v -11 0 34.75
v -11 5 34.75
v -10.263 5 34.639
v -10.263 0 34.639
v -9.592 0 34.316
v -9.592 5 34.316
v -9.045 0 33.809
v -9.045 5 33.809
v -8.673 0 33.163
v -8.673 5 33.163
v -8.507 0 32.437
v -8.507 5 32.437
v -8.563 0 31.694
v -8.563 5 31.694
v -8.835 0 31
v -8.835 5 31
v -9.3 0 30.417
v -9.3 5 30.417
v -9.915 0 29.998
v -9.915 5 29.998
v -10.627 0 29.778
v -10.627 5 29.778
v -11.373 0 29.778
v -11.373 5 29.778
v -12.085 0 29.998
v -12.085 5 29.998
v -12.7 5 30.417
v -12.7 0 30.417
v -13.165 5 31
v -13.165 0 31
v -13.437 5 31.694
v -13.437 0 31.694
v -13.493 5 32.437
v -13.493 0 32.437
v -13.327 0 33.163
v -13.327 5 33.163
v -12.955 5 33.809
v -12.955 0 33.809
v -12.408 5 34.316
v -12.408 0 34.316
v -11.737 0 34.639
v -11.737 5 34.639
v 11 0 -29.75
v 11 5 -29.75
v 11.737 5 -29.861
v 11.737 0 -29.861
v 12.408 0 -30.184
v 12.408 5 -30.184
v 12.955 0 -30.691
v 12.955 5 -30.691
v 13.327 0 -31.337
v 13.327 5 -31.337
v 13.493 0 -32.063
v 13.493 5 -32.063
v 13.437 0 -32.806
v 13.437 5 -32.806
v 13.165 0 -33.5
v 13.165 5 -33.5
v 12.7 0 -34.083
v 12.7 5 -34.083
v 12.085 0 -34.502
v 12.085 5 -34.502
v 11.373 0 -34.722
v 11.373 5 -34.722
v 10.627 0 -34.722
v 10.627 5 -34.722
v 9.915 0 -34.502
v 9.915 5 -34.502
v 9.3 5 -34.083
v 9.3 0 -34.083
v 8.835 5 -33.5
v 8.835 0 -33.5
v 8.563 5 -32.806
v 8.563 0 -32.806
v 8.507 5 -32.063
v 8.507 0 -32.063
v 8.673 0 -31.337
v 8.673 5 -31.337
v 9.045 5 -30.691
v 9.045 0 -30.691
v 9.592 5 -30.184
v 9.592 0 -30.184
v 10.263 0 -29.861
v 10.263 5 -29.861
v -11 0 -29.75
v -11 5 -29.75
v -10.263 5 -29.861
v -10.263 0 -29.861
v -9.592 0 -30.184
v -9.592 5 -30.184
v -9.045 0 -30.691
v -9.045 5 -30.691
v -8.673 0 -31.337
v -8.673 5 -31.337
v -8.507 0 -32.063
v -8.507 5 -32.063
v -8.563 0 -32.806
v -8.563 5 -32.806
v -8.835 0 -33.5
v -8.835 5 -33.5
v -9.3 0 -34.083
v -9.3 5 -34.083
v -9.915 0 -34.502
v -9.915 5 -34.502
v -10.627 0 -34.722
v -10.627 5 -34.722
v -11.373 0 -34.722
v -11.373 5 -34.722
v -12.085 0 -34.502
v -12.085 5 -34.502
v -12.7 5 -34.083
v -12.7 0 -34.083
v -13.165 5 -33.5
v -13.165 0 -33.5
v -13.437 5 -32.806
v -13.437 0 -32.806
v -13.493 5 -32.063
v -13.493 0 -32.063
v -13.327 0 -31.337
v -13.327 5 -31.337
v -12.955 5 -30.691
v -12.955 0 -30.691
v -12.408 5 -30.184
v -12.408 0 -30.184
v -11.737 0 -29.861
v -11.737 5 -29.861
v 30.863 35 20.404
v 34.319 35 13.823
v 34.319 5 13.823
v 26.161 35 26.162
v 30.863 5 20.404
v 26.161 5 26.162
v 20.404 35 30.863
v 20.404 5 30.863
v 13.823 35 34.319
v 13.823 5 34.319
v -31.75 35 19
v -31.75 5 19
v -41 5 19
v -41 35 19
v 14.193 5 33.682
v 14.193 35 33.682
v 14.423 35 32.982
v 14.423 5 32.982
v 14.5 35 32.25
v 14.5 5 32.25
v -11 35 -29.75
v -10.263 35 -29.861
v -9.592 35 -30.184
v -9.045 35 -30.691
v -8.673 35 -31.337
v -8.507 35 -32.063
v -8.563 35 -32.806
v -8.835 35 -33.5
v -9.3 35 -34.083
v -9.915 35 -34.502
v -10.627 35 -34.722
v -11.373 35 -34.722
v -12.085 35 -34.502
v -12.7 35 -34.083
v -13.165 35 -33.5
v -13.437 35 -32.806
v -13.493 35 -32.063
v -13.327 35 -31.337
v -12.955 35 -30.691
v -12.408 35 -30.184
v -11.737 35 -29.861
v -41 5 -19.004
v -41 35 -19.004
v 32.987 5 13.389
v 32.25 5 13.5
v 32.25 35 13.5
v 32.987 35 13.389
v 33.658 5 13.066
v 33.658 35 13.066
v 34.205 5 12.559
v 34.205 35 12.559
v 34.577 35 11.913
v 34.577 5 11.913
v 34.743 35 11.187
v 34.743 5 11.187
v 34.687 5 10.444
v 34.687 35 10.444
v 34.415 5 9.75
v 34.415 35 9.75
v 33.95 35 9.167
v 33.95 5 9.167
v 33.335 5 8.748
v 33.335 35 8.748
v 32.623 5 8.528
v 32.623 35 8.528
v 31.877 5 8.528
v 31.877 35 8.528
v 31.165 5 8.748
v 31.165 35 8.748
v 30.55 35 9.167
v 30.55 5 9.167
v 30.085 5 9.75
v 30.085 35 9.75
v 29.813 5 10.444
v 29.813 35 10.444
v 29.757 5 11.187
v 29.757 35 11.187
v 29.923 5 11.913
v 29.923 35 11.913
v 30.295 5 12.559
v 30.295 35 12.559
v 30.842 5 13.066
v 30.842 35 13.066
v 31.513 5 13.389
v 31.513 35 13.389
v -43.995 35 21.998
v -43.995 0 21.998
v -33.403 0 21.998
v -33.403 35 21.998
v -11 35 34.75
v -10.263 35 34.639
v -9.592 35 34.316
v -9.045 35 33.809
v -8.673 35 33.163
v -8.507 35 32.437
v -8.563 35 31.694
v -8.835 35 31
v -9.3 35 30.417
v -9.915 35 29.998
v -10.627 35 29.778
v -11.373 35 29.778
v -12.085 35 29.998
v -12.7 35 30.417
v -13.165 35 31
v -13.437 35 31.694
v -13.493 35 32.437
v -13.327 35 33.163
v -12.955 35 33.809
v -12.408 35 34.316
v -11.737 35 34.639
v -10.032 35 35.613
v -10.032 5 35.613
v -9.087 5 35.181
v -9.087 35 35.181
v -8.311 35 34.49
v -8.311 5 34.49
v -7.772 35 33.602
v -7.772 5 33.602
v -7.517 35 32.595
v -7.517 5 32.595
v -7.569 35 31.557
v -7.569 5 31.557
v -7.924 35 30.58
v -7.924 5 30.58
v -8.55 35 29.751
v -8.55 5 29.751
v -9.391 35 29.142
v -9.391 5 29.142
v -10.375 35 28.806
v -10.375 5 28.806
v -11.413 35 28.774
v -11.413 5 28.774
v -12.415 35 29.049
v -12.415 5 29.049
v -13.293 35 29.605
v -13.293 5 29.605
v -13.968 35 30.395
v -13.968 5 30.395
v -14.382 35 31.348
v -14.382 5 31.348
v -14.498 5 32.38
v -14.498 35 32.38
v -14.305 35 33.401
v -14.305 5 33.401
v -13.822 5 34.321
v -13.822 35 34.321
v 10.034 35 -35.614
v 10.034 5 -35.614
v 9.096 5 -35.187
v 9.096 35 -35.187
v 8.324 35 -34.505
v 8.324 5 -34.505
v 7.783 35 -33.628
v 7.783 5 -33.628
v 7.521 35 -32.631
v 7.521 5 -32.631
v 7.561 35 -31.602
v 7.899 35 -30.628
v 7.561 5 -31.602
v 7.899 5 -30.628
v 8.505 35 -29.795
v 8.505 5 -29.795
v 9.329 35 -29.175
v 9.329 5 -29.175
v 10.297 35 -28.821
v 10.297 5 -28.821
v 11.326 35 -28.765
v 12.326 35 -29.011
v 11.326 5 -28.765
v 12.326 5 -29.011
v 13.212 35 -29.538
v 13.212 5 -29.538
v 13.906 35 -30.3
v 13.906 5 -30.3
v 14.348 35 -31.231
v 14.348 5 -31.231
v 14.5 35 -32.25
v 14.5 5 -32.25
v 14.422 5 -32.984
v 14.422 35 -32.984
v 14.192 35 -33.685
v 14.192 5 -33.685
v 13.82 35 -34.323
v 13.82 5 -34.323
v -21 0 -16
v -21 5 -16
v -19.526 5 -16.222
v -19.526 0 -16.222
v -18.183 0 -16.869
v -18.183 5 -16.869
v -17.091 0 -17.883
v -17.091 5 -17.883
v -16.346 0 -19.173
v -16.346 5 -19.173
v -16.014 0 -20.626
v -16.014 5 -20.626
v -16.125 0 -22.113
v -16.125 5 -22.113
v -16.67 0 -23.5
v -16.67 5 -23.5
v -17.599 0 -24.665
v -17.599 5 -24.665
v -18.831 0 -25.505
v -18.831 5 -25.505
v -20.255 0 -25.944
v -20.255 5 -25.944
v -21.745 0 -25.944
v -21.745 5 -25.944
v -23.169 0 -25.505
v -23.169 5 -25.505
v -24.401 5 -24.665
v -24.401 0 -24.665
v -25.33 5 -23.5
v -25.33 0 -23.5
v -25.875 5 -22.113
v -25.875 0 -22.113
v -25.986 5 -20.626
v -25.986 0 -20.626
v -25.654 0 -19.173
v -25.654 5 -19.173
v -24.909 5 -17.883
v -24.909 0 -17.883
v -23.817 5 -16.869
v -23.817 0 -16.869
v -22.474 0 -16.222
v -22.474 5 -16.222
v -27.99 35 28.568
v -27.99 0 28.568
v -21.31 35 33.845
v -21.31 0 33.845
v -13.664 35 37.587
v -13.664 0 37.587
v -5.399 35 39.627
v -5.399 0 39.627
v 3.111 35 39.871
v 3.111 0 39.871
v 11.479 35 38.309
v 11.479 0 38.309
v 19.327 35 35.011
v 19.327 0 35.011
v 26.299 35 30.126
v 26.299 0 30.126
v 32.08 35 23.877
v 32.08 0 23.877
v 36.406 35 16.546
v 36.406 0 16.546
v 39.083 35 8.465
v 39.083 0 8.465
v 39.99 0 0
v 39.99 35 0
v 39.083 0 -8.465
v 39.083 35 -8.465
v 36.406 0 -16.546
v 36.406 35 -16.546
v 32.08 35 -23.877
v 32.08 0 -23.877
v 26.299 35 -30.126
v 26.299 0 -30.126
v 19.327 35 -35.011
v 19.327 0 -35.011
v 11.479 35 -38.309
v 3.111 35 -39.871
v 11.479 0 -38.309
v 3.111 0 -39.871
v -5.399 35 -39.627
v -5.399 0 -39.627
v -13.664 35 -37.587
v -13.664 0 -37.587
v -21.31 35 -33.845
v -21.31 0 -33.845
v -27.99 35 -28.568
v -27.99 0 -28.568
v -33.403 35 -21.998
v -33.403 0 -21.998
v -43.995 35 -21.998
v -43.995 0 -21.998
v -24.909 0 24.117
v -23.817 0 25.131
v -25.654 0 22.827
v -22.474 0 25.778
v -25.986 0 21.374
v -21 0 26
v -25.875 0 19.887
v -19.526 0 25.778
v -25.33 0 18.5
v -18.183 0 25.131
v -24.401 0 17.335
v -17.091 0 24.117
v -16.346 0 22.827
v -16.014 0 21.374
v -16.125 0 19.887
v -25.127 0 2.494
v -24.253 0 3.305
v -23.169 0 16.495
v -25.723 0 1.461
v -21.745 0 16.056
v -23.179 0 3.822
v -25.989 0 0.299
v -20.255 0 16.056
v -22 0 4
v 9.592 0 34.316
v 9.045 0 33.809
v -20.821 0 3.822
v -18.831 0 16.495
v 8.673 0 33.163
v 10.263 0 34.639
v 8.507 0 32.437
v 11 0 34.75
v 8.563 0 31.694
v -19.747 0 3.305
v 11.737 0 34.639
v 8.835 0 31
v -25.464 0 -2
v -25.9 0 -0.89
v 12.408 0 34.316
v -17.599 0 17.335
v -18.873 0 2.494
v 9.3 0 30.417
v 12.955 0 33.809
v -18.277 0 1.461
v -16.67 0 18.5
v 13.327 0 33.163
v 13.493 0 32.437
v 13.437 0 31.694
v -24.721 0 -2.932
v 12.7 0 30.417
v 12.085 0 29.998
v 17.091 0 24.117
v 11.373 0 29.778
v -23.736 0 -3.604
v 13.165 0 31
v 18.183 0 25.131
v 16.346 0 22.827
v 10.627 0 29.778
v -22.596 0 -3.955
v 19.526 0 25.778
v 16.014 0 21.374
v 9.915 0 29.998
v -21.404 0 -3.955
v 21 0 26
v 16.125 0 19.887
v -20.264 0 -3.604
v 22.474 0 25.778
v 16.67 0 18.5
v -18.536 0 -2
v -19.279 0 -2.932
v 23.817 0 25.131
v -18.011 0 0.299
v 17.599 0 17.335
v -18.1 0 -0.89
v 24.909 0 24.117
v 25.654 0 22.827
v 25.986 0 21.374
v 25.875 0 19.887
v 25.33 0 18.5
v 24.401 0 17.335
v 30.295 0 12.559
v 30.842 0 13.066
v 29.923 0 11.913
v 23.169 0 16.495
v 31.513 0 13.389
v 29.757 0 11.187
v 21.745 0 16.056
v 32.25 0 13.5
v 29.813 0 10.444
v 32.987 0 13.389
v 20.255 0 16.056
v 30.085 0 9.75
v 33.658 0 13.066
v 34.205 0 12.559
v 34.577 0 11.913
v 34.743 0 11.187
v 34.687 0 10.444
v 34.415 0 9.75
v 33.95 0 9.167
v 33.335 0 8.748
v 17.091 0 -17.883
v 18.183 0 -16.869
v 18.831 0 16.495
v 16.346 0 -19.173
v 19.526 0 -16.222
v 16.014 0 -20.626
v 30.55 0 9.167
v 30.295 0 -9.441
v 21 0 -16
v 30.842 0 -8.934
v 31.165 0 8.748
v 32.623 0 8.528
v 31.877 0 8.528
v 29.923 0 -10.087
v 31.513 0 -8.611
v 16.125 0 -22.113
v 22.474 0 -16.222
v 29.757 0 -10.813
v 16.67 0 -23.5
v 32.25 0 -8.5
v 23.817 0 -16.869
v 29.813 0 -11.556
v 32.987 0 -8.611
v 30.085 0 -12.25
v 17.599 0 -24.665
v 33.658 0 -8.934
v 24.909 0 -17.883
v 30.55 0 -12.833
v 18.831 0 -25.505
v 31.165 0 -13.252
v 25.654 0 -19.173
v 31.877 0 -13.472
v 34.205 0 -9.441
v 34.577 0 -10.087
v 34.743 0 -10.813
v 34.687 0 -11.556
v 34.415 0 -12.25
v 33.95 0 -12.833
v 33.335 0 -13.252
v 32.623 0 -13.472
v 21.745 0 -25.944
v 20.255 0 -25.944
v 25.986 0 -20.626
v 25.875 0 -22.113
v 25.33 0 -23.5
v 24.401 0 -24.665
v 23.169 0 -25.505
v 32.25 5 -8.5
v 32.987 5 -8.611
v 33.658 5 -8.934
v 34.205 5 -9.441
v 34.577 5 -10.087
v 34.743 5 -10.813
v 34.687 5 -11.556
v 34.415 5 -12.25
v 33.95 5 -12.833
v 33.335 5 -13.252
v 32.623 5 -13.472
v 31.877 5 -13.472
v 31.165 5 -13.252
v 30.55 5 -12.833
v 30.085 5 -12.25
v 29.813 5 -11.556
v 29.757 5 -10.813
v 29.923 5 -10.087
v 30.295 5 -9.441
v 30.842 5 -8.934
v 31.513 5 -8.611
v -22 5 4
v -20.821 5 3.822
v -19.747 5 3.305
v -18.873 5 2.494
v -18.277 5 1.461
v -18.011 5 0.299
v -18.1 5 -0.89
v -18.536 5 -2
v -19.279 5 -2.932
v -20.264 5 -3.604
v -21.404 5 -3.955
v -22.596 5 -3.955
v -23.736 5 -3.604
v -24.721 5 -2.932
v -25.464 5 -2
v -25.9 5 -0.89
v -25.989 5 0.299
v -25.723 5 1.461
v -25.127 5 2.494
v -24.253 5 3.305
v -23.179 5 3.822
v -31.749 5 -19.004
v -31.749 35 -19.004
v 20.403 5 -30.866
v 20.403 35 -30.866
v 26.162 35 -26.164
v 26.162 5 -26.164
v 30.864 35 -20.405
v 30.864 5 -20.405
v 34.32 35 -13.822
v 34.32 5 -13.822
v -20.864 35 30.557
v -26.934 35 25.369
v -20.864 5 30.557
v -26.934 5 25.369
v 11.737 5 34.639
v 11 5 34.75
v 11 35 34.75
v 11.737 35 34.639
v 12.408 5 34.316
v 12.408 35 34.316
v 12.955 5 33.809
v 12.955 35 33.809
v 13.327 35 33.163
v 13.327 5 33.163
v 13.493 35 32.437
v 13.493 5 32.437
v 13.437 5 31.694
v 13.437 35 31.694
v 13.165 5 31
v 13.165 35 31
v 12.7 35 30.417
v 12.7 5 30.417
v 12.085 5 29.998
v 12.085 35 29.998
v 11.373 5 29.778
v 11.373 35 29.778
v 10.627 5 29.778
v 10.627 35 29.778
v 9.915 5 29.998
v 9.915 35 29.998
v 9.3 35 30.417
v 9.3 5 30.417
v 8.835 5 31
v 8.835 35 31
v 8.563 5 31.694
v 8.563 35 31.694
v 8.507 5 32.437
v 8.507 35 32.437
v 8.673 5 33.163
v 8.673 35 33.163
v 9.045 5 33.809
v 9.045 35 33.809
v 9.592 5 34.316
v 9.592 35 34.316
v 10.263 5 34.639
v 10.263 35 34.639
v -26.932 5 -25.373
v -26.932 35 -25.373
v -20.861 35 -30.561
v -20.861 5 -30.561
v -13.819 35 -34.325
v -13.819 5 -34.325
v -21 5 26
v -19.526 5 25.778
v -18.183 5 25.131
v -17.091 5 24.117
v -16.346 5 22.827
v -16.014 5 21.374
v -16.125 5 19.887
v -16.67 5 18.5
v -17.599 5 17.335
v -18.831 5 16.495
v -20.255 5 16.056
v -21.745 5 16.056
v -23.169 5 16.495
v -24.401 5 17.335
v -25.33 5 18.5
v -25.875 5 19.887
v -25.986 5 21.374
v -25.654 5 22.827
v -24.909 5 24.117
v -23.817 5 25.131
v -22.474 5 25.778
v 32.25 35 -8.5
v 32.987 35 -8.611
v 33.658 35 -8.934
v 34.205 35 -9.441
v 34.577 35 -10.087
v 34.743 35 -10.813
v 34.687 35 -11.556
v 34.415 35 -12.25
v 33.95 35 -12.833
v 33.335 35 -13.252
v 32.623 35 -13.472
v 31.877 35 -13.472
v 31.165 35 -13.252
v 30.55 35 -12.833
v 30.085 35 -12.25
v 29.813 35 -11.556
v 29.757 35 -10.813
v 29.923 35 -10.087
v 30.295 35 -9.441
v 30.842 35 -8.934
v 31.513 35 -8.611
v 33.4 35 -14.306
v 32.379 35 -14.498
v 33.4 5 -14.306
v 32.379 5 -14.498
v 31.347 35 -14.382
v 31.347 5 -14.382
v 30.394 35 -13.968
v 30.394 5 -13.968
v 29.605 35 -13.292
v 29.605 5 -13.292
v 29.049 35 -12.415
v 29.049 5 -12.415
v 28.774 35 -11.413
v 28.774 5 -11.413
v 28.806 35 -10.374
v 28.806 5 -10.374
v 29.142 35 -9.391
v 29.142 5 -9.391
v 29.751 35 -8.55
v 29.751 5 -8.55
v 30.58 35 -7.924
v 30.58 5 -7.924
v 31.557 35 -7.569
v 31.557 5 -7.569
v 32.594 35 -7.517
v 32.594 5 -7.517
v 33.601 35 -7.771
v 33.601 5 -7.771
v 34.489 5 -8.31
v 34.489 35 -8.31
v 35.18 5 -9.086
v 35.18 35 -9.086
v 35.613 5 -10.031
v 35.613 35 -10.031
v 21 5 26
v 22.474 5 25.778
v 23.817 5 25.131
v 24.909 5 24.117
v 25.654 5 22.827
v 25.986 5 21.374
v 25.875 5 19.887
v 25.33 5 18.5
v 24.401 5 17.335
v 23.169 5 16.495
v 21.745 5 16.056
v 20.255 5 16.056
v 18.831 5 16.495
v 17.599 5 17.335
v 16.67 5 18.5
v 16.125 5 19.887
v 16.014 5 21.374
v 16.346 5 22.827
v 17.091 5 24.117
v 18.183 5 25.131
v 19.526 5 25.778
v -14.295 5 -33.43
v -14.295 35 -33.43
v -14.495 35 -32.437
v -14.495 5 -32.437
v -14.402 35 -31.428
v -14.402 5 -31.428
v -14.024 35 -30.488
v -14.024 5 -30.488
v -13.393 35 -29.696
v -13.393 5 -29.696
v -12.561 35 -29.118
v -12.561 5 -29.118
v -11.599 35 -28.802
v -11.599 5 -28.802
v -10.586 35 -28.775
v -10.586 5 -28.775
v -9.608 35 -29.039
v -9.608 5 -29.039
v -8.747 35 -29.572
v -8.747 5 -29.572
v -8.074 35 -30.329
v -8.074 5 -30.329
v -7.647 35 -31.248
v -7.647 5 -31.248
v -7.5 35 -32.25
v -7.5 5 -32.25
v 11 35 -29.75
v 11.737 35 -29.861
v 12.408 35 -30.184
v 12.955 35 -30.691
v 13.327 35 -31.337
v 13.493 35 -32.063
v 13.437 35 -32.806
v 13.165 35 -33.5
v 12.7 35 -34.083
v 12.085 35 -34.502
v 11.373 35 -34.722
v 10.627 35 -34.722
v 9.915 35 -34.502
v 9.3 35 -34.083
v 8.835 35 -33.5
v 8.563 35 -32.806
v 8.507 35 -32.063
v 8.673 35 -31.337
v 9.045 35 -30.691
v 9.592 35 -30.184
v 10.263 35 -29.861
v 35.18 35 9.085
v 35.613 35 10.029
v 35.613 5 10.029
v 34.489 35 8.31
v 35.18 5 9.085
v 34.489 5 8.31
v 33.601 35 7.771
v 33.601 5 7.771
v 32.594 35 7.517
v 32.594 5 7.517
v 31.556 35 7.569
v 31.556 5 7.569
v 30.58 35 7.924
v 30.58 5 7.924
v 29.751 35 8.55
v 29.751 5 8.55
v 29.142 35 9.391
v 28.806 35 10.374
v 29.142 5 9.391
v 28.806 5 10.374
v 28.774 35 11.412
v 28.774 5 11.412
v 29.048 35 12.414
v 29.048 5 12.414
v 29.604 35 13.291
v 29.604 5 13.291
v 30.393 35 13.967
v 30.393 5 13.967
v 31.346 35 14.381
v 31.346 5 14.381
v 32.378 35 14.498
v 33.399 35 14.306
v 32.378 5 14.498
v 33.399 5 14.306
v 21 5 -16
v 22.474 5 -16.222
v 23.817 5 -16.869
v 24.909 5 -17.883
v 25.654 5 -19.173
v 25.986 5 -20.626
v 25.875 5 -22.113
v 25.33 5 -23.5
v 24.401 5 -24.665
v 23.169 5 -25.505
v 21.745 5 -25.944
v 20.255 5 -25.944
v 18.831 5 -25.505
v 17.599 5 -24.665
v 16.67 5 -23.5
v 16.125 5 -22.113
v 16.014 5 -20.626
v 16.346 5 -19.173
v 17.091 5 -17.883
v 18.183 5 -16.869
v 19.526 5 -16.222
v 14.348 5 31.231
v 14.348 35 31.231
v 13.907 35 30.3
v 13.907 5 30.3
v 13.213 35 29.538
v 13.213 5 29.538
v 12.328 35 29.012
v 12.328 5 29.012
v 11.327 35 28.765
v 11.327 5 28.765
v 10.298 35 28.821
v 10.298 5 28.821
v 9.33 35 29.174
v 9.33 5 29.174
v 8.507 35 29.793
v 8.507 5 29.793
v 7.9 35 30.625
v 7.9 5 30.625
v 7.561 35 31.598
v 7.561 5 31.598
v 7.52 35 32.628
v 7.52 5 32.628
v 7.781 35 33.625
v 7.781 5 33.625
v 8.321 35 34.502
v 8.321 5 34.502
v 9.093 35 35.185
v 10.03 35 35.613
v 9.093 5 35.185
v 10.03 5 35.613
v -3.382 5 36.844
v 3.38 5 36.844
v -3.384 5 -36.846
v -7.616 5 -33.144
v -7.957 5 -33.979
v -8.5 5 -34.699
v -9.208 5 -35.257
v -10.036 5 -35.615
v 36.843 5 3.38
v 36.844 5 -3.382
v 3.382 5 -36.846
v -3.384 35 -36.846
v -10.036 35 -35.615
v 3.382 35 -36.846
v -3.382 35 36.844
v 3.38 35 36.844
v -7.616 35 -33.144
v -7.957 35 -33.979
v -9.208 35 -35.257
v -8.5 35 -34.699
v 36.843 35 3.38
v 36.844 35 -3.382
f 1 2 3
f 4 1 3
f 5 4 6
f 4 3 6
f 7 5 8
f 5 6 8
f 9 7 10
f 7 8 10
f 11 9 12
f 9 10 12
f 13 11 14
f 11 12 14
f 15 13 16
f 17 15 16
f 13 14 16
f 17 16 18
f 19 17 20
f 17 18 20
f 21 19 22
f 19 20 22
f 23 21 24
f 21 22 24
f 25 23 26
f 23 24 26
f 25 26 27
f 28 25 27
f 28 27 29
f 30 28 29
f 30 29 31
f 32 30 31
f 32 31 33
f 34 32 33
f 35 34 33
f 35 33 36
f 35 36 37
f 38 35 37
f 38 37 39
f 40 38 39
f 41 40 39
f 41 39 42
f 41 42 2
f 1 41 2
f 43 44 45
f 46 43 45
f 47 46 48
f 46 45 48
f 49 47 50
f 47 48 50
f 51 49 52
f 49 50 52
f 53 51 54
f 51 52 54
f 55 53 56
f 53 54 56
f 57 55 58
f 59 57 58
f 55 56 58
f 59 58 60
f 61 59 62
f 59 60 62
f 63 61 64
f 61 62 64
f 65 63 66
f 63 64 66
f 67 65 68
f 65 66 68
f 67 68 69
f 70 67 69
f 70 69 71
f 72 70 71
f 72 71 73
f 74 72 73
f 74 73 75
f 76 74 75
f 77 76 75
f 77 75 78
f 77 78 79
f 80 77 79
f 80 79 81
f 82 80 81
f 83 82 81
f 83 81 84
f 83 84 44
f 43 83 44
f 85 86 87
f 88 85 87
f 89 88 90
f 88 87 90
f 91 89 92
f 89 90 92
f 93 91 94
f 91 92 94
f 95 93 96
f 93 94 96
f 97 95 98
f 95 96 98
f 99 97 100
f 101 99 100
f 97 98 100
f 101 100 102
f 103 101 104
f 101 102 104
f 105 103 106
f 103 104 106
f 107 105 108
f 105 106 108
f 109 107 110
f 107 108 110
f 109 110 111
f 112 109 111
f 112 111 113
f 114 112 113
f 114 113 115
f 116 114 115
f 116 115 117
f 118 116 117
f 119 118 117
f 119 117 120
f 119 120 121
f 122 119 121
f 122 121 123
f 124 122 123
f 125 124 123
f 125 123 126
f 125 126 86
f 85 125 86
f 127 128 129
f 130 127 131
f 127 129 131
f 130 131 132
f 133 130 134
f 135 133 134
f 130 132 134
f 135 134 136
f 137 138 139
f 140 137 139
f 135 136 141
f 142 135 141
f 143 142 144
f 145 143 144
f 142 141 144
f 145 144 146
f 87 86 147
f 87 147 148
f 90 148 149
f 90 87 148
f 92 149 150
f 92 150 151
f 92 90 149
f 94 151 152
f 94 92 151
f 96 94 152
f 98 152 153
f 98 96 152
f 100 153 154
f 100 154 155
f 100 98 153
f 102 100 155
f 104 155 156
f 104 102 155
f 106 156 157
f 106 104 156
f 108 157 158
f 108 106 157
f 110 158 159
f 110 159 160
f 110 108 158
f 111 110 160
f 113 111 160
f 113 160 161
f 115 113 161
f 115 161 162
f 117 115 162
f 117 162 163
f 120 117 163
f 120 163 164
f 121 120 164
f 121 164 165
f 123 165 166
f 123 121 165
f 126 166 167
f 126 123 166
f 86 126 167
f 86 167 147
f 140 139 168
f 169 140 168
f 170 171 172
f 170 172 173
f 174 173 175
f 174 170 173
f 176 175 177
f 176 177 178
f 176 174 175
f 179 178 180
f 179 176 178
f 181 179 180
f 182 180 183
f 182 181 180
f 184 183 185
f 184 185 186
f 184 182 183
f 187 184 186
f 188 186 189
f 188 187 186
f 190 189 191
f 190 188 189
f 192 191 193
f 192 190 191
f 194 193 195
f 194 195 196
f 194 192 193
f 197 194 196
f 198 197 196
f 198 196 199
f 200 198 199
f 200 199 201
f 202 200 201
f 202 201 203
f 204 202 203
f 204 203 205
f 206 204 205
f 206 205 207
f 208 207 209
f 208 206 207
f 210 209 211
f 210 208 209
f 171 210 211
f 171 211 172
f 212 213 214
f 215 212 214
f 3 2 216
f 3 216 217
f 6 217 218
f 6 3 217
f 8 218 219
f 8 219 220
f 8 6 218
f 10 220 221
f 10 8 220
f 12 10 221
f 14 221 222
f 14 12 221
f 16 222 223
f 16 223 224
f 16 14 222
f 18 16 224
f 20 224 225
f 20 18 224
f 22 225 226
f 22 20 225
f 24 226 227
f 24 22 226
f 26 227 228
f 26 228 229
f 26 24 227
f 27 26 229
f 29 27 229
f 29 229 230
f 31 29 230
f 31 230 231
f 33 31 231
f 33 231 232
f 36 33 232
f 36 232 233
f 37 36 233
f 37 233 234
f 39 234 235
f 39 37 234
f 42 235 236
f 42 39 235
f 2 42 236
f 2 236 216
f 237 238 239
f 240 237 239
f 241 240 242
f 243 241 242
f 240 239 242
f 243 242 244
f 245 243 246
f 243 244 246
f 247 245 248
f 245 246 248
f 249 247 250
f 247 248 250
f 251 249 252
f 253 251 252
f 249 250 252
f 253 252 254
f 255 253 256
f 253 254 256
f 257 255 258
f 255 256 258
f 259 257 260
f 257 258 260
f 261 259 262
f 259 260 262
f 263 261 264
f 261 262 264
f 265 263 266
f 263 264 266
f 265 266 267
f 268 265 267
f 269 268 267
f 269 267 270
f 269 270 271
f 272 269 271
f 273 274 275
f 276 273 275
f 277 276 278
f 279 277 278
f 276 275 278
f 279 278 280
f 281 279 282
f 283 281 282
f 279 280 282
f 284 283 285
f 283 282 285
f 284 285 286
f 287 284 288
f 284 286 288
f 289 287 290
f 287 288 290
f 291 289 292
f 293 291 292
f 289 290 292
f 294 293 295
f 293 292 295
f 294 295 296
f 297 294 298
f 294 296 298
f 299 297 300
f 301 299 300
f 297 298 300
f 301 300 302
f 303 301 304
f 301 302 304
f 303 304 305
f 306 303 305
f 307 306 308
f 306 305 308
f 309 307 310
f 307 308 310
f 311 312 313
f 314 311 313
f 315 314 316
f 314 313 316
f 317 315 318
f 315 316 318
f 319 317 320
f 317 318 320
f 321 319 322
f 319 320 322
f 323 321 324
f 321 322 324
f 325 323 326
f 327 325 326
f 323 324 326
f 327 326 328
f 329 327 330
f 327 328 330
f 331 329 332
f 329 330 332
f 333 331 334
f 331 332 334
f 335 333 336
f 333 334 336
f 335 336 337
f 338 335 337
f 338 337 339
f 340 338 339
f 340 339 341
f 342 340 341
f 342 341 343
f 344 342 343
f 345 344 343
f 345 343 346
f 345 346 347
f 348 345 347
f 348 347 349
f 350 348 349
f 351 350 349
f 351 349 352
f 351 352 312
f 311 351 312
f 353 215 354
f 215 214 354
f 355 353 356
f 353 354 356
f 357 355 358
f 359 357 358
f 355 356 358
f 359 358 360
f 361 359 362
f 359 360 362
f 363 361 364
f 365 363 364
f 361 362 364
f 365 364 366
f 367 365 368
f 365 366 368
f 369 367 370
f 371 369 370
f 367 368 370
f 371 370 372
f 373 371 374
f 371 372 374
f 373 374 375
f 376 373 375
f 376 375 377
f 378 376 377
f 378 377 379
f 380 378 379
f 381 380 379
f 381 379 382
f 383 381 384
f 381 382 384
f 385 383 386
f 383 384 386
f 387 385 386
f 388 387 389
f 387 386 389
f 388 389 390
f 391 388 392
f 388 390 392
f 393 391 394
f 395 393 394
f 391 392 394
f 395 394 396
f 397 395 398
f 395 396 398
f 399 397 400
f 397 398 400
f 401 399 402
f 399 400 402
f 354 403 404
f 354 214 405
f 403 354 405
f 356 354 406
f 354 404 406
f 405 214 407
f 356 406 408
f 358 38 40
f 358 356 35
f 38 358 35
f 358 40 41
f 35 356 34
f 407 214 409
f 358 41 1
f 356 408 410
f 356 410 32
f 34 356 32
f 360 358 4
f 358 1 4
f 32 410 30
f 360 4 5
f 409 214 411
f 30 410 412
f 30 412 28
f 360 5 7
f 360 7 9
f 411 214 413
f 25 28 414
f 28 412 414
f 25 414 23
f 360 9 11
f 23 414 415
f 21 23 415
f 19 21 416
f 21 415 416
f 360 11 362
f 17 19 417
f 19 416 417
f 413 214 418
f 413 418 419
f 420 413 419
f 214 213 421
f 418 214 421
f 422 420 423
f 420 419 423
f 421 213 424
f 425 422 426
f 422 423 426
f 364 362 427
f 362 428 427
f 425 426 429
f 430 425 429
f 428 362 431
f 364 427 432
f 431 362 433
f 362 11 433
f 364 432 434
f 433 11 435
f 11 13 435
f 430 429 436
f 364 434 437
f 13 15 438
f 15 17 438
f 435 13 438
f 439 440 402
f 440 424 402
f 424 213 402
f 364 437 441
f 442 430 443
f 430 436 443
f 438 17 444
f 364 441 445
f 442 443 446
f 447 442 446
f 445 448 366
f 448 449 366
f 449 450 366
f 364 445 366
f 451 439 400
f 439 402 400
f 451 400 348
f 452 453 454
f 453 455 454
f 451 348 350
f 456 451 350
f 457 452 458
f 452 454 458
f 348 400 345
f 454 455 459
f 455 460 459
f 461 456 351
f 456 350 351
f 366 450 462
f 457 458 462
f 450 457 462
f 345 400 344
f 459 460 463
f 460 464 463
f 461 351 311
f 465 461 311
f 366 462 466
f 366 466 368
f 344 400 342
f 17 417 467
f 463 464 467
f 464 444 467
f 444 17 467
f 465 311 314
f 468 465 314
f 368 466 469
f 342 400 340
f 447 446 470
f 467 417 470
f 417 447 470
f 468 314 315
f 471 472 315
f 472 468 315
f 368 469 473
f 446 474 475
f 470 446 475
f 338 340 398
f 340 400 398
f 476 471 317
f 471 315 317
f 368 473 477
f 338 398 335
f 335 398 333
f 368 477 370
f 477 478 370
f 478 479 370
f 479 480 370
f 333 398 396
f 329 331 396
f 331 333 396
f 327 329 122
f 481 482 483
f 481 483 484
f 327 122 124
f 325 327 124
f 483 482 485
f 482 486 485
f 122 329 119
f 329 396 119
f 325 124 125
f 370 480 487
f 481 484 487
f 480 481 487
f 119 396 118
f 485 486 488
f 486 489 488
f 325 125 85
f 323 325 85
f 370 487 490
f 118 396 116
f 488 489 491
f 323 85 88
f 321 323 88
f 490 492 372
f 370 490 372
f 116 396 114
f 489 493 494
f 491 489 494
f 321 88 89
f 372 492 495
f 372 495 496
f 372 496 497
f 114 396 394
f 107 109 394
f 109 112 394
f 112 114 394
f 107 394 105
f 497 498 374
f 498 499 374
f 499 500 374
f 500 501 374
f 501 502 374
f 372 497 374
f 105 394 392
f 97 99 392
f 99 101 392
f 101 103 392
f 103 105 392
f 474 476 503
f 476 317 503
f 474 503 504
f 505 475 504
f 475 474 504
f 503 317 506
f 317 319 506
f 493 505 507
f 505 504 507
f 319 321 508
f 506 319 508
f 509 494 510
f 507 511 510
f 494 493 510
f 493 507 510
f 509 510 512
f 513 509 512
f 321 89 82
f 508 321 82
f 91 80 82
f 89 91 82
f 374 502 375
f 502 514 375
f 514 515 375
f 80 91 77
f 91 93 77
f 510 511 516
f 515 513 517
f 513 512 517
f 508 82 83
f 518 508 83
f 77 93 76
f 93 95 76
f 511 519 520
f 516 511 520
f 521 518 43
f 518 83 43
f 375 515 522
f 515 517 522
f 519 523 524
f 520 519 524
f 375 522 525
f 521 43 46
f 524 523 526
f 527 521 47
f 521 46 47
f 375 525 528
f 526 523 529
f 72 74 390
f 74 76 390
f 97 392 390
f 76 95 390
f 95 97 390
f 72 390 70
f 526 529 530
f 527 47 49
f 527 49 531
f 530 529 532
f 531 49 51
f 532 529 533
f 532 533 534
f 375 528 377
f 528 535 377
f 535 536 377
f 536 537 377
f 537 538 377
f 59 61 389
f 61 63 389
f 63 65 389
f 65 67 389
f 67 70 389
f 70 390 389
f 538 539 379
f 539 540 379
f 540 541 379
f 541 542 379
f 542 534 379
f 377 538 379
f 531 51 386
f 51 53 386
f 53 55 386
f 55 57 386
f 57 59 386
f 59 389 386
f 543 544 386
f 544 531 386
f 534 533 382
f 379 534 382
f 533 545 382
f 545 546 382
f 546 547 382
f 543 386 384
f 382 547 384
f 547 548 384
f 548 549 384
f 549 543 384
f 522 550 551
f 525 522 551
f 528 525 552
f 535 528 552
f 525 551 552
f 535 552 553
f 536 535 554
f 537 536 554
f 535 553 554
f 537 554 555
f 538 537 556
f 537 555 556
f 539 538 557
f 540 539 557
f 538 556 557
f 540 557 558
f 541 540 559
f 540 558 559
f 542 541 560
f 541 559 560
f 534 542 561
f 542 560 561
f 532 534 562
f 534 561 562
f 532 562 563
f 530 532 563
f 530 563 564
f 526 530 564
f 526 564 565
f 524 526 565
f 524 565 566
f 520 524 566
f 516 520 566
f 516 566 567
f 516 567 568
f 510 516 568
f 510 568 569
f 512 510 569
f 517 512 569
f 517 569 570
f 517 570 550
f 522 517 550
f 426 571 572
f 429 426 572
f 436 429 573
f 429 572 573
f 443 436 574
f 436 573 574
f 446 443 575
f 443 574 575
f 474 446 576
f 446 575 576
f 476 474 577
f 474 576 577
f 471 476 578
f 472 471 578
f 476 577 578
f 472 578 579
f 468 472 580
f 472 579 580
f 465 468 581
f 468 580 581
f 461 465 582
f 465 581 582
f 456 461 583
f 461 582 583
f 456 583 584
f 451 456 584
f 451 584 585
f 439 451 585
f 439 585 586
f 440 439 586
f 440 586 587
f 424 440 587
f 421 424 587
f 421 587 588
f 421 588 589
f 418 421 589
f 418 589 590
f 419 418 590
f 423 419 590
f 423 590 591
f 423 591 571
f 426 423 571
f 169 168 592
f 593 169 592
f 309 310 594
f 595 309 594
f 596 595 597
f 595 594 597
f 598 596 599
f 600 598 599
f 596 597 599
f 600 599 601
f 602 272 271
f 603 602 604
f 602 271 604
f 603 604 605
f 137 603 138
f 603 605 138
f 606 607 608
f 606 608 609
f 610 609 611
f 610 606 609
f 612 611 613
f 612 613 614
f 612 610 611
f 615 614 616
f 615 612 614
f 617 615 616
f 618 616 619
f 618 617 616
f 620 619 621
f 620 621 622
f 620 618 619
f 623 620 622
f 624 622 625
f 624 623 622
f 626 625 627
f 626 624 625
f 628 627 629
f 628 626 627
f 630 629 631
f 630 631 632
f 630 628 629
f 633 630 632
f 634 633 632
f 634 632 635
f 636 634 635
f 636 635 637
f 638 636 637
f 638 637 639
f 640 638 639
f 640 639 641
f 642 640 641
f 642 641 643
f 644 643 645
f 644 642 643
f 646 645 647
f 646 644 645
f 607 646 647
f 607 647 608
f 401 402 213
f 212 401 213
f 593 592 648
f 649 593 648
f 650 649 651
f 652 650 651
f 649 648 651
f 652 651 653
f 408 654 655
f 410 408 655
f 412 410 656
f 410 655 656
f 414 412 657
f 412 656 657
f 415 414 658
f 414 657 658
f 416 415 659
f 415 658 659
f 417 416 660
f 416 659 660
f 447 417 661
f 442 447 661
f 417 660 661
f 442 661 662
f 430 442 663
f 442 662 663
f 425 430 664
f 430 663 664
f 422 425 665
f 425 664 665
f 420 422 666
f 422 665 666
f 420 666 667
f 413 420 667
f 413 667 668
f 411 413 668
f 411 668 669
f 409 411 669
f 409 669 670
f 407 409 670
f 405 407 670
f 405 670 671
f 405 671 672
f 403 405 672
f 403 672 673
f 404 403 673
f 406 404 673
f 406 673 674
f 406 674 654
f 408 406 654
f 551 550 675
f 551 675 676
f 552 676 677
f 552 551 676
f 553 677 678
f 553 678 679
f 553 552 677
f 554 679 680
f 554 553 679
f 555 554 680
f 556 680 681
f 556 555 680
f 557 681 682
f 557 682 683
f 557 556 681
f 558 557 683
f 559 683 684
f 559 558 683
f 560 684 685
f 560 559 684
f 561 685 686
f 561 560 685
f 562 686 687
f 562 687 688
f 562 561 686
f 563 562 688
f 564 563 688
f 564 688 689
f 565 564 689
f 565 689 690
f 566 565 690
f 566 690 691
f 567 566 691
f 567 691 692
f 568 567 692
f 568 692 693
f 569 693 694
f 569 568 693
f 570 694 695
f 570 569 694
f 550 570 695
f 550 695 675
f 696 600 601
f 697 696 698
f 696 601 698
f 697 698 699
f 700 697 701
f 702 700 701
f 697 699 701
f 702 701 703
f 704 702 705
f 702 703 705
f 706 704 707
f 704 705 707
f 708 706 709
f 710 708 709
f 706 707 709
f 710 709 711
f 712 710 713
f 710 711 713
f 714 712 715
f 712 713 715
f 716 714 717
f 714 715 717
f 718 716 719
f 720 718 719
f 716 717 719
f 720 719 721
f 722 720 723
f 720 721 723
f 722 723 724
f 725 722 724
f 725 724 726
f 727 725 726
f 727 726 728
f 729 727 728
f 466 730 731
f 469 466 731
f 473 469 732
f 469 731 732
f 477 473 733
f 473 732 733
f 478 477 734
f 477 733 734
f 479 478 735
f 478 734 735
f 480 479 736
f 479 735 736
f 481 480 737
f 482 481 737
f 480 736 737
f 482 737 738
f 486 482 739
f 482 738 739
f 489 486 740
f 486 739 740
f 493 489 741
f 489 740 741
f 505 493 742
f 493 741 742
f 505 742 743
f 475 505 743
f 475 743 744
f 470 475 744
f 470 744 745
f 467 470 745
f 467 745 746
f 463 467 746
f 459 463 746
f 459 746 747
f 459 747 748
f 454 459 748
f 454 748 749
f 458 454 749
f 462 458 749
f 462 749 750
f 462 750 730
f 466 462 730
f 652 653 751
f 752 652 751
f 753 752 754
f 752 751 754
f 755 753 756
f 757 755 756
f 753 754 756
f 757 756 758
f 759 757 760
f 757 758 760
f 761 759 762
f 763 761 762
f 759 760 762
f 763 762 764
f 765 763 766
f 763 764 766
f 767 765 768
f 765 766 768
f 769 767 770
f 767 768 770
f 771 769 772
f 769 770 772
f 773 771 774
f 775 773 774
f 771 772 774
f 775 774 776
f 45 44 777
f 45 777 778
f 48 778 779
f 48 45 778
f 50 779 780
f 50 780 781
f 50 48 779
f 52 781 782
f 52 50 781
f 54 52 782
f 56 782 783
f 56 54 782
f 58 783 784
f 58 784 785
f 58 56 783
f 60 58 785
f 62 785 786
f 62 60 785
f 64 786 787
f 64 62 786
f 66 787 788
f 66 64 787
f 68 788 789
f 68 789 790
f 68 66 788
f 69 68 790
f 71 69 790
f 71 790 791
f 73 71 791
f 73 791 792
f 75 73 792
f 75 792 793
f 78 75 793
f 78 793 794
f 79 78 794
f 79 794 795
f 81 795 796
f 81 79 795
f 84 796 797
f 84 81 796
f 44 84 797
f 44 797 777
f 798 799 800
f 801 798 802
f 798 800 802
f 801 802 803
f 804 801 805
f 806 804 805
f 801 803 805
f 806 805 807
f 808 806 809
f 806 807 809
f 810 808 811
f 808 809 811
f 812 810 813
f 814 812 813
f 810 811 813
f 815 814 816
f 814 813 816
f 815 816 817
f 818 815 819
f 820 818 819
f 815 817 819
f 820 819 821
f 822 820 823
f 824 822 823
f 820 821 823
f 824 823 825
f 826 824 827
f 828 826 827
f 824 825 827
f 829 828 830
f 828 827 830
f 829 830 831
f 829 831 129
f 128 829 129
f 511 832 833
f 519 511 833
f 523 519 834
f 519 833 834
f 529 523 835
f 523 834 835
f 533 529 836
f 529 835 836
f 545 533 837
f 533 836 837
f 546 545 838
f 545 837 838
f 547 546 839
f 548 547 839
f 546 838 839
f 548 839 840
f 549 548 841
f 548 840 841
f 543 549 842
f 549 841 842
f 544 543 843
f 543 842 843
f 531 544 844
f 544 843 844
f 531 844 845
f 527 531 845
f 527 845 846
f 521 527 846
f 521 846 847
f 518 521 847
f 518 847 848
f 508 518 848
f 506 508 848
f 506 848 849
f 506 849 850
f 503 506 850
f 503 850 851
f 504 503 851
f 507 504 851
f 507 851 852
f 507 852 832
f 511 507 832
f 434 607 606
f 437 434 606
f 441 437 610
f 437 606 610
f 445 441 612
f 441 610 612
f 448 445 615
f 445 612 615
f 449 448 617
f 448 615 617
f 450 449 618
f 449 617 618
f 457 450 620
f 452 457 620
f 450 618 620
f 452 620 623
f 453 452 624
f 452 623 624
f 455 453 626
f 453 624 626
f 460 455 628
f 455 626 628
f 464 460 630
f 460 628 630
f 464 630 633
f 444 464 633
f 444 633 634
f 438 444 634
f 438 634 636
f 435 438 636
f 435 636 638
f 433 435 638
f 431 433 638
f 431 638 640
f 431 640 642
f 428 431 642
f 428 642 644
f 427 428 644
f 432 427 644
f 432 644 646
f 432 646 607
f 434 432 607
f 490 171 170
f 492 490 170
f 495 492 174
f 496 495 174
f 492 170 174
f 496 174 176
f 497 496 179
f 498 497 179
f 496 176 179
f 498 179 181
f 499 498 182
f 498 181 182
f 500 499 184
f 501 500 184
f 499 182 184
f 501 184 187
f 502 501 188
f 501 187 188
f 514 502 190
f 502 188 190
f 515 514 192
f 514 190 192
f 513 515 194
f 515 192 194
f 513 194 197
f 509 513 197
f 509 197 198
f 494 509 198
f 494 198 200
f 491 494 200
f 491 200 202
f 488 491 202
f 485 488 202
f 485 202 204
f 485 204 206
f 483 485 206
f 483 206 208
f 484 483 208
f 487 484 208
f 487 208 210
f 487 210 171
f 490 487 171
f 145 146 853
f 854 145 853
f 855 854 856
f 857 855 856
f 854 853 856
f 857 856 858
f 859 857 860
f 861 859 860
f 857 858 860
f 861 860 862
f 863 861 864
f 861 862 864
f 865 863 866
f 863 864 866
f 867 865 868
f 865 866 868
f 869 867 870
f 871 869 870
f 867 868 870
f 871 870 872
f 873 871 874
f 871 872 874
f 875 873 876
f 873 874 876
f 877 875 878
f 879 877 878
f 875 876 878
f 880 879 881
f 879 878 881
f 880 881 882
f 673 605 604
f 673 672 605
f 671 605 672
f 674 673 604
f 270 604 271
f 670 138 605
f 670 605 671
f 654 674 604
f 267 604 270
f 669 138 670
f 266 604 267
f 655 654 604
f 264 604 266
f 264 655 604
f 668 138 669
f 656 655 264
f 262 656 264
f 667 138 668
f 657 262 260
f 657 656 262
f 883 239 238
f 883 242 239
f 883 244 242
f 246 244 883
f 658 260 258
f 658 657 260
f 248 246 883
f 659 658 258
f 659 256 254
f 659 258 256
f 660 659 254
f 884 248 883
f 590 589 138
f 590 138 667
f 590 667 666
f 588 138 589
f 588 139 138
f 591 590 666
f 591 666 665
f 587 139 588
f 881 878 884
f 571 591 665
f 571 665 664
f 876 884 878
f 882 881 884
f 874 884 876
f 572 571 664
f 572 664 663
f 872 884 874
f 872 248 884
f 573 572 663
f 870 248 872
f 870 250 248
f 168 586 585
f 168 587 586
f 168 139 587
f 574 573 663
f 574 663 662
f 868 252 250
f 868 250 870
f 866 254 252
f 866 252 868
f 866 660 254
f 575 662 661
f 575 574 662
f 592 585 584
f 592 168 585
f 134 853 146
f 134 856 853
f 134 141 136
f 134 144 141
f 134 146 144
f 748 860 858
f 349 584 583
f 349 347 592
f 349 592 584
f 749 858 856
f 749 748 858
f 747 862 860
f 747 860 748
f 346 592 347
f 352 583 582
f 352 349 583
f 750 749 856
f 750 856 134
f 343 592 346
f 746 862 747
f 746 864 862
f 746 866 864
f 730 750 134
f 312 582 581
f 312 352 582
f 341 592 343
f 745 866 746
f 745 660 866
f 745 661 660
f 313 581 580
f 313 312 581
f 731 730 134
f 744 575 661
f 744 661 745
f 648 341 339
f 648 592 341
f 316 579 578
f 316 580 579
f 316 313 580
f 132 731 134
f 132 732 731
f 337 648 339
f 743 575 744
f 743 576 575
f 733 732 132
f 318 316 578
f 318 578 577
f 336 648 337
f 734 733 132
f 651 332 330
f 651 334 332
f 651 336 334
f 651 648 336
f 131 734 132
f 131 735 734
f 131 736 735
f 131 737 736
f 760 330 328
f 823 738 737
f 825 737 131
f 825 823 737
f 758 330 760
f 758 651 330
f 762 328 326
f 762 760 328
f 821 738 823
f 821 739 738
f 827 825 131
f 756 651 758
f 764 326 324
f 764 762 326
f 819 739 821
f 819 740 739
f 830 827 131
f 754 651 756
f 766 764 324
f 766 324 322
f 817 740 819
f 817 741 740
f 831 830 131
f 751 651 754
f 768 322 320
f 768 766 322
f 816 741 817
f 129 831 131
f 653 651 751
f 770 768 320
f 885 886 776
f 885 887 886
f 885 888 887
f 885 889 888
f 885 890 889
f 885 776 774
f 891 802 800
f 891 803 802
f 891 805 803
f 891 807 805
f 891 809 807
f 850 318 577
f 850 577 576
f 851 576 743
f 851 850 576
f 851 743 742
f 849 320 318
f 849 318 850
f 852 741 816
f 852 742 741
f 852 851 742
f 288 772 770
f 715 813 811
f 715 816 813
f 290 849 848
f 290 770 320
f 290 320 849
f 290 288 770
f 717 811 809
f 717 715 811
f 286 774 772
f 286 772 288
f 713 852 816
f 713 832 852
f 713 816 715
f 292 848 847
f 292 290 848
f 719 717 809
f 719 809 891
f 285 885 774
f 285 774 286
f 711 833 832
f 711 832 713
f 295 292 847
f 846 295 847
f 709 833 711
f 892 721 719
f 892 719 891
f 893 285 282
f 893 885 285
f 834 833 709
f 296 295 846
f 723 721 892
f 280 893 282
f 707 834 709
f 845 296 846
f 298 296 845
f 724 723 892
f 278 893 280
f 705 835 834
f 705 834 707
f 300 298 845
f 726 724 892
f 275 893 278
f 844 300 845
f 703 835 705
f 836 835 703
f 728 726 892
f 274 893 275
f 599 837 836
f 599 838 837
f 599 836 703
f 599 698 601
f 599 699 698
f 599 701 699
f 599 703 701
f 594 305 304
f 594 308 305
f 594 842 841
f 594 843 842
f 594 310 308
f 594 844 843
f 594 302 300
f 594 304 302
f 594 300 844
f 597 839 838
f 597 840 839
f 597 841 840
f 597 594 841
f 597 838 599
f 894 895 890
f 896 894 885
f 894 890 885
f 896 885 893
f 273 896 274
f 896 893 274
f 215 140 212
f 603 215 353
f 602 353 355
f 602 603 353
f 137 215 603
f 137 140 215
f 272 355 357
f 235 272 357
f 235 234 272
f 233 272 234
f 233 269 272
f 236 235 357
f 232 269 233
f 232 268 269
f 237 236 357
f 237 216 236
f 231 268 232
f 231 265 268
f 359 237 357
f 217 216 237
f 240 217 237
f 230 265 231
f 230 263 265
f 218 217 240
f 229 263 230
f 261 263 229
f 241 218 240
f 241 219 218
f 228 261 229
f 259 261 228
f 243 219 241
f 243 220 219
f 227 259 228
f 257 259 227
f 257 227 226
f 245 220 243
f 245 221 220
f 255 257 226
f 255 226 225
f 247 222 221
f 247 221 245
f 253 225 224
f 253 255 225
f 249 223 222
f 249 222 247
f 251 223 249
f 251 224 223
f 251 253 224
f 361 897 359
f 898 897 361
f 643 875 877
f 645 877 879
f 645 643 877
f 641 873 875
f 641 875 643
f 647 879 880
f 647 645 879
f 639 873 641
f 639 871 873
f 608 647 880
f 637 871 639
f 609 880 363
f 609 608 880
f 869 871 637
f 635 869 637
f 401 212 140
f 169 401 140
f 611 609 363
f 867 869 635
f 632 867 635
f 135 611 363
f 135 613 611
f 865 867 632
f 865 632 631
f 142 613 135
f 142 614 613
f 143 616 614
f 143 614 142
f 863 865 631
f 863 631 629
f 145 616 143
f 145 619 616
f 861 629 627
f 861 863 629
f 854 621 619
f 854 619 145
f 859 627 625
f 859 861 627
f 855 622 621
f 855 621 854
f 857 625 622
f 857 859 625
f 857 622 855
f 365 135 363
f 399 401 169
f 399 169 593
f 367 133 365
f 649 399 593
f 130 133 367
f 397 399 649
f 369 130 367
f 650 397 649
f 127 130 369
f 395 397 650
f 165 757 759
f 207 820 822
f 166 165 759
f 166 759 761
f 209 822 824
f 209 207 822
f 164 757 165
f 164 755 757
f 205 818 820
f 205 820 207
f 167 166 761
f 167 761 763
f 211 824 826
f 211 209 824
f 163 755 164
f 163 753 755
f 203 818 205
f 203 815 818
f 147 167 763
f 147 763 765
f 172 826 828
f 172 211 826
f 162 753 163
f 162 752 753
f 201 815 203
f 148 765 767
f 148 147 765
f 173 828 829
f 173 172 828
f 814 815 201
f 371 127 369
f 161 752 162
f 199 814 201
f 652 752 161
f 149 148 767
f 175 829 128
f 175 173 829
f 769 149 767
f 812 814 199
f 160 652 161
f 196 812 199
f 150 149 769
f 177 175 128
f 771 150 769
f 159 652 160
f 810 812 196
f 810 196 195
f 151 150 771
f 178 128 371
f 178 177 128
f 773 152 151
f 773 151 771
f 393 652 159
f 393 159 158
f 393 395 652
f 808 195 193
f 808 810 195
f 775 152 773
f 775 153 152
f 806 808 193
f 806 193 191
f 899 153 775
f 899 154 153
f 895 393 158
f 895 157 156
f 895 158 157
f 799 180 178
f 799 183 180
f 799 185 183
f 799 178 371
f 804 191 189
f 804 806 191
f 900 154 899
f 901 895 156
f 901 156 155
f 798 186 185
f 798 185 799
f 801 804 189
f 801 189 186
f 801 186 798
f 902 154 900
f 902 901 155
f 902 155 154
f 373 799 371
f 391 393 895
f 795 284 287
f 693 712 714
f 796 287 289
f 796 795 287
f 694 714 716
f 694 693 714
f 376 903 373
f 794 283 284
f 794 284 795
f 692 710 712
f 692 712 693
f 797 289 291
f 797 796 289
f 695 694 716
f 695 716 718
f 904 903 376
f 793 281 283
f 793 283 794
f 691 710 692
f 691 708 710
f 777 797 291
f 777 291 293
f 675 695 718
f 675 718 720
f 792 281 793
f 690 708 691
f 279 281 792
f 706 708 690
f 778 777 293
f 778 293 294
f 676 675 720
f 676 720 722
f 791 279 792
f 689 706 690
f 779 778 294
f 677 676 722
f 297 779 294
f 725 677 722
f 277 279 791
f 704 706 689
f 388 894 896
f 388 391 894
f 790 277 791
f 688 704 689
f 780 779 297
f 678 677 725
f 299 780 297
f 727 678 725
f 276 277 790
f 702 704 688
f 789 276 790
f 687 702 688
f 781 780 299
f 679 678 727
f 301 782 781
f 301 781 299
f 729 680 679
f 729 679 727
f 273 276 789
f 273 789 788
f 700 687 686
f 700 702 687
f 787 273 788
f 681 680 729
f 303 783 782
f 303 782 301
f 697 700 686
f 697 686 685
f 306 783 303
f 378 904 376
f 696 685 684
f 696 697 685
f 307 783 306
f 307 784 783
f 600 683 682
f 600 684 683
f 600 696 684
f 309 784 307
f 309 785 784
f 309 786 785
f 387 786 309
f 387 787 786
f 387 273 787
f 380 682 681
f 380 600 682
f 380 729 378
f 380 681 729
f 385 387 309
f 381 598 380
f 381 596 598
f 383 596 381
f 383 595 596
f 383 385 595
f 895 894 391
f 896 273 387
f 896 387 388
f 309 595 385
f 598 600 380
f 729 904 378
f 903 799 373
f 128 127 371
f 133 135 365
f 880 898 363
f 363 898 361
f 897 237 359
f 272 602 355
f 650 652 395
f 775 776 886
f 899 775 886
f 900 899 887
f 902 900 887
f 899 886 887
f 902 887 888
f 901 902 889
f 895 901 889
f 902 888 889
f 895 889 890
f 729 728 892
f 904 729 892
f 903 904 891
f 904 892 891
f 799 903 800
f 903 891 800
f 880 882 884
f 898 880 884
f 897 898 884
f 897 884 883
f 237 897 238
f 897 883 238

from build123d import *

# Parameters (mm, degrees)
BOSS_EXTRUDE5_DEPTH = 5
BOSS_EXTRUDE6_DEPTH = 30
SKETCH4_R           = 4
SKETCH4_R_2         = 5
CUT_EXTRUDE1_DEPTH  = 30
SKETCH5_R           = 2.5
CUT_EXTRUDE2_DEPTH  = 30
SKETCH6_R           = 2.5
BOSS_EXTRUDE8_DEPTH = 30


with BuildPart() as part:
    # Sketch1 → Boss-Extrude5 (new body)
    with BuildSketch(Plane(origin=(0, 0, 0), x_dir=(1, 0, 0), z_dir=(0, 1, 0))):
        with BuildLine():
            Line((-43.995148291, 21.997574146), (-43.995148291, 0))
            Line((-43.995148291, 0), (-43.995148291, -21.997574146))
            Line((-43.995148291, -21.997574146), (-33.402902563, -21.997574146))
            ThreePointArc((-33.402902563, -21.997574146), (39.989521092, 0), (-33.402902563, 21.997574146))
            Line((-33.402902563, 21.997574146), (-43.995148291, 21.997574146))
        make_face()
    extrude(amount=BOSS_EXTRUDE5_DEPTH)

    # Sketch3 → Boss-Extrude6 (add)
    with BuildSketch(Plane(origin=(0, 5, 0), x_dir=(1, 0, 0), z_dir=(0, 1, 0))):
        with BuildLine():
            Line((-43.995148291, -21.997574146), (-33.402902563, -21.997574146))
            ThreePointArc((-33.402902563, -21.997574146), (39.989521092, 0), (-33.402902563, 21.997574146))
            Line((-33.402902563, 21.997574146), (-43.995148291, 21.997574146))
            Line((-43.995148291, 21.997574146), (-43.995148291, -21.997574146))
        make_face()
        with BuildLine():
            Line((-41, 19.004191941), (-31.749015624, 19.004191941))
            ThreePointArc((-31.749015624, 19.004191941), (36.998253479, 0.000315282), (-31.75, -19))
            Line((-31.75, -19), (-41, -19))
            Line((-41, -19), (-41, 19.004191941))
        make_face(mode=Mode.SUBTRACT)
    extrude(amount=BOSS_EXTRUDE6_DEPTH)

    # Sketch4 → Cut-Extrude1 (cut)
    with BuildSketch(Plane(origin=(0, 5, 0), x_dir=(1, 0, 0), z_dir=(0, 1, 0))):
        with Locations(Location((-22, 0, 0), (0, 0, 270))):
            Circle(SKETCH4_R)
        with Locations(Location((-21, 21, 0), (0, 0, 270))):
            Circle(SKETCH4_R_2)
        with Locations(Location((21, 21, 0), (0, 0, 270))):
            Circle(SKETCH4_R_2)
        with Locations(Location((21, -21, 0), (0, 0, 270))):
            Circle(SKETCH4_R_2)
        with Locations(Location((-21, -21, 0), (0, 0, 270))):
            Circle(SKETCH4_R_2)
    extrude(amount=-CUT_EXTRUDE1_DEPTH, mode=Mode.SUBTRACT)

    # Sketch5 → Cut-Extrude2 (cut)
    with BuildSketch(Plane(origin=(0, 5, 0), x_dir=(1, 0, 0), z_dir=(0, 1, 0))):
        with Locations(Location((-11, 32.25, 0), (0, 0, 270))):
            Circle(SKETCH5_R)
        with Locations(Location((11, 32.25, 0), (0, 0, 270))):
            Circle(SKETCH5_R)
        with Locations(Location((32.25, -11, 0), (0, 0, 270))):
            Circle(SKETCH5_R)
        with Locations(Location((32.25, 11, 0), (0, 0, 270))):
            Circle(SKETCH5_R)
        with Locations(Location((11, -32.25, 0), (0, 0, 270))):
            Circle(SKETCH5_R)
        with Locations(Location((-11, -32.25, 0), (0, 0, 270))):
            Circle(SKETCH5_R)
    extrude(amount=-CUT_EXTRUDE2_DEPTH, mode=Mode.SUBTRACT)

    # Sketch6 → Boss-Extrude8 (add)
    # profile 1 of 6: a face of its own
    with BuildSketch(Plane(origin=(0, 5, 0), x_dir=(1, 0, 0), z_dir=(0, 1, 0))):
        with BuildLine():
            ThreePointArc((-13.818927057, 34.324524101), (-12.091731491, 28.92462448), (-7.5, 32.25))
            ThreePointArc((-7.5, 32.25), (-8.205027171, 34.356686233), (-10.036072506, 35.614646161))
            ThreePointArc((-10.036072506, 35.614646161), (-11.944932636, 35.020701186), (-13.818927057, 34.324524101))
        make_face()
        with Locations(Location((-11, 32.25, 0), (0, 0, 270))):
            Circle(SKETCH6_R, mode=Mode.SUBTRACT)
    # profile 2 of 6: a face of its own
    with BuildSketch(Plane(origin=(0, 5, 0), x_dir=(1, 0, 0), z_dir=(0, 1, 0))):
        with BuildLine():
            ThreePointArc((13.820396396, 34.322526036), (11.94483736, 35.019542221), (10.034341301, 35.614149711))
            ThreePointArc((10.034341301, 35.614149711), (8.894032936, 29.454485249), (14.5, 32.25))
            ThreePointArc((14.5, 32.25), (14.325762122, 33.340553212), (13.820396396, 34.322526036))
        make_face()
        with Locations(Location((11, 32.25, 0), (0, 0, 270))):
            Circle(SKETCH6_R, mode=Mode.SUBTRACT)
    # profile 3 of 6: a face of its own
    with BuildSketch(Plane(origin=(0, 5, 0), x_dir=(1, 0, 0), z_dir=(0, 1, 0))):
        with BuildLine():
            ThreePointArc((35.613053698, 10.030531162), (35.017865848, 11.943917844), (34.319964959, 13.822276575))
            ThreePointArc((34.319964959, 13.822276575), (28.937333966, 9.870290414), (35.613053698, 10.030531162))
        make_face()
        with Locations(Location((32.25, 11, 0), (0, 0, 270))):
            Circle(SKETCH6_R, mode=Mode.SUBTRACT)
    # profile 4 of 6: a face of its own
    with BuildSketch(Plane(origin=(0, 5, 0), x_dir=(1, 0, 0), z_dir=(0, 1, 0))):
        with BuildLine():
            ThreePointArc((34.318509264, -13.82334366), (35.017020802, -11.943848204), (35.612690699, -10.029272818))
            ThreePointArc((35.612690699, -10.029272818), (28.937413903, -9.870056041), (34.318509264, -13.82334366))
        make_face()
        with Locations(Location((32.25, -11, 0), (0, 0, 270))):
            Circle(SKETCH6_R, mode=Mode.SUBTRACT)
    # profile 5 of 6: a face of its own
    with BuildSketch(Plane(origin=(0, 5, 0), x_dir=(1, 0, 0), z_dir=(0, 1, 0))):
        with BuildLine():
            ThreePointArc((10.02986849, -35.612862598), (11.943992144, -35.017283262), (13.82305009, -34.318909904))
            ThreePointArc((13.82305009, -34.318909904), (14.326460229, -33.338421951), (14.5, -32.25))
            ThreePointArc((14.5, -32.25), (8.895892147, -29.453085603), (10.02986849, -35.612862598))
        make_face()
        with Locations(Location((11, -32.25, 0), (0, 0, 270))):
            Circle(SKETCH6_R, mode=Mode.SUBTRACT)
    # profile 6 of 6: a face of its own
    with BuildSketch(Plane(origin=(0, 5, 0), x_dir=(1, 0, 0), z_dir=(0, 1, 0))):
        with BuildLine():
            ThreePointArc((-13.821585883, -34.320906348), (-11.944087605, -35.018442073), (-10.031594901, -35.61336016))
            ThreePointArc((-10.031594901, -35.61336016), (-8.203625754, -34.354825664), (-7.5, -32.25))
            ThreePointArc((-7.5, -32.25), (-12.089598414, -28.923924941), (-13.821585883, -34.320906348))
        make_face()
        with Locations(Location((-11, -32.25, 0), (0, 0, 270))):
            Circle(SKETCH6_R, mode=Mode.SUBTRACT)
    extrude(amount=BOSS_EXTRUDE8_DEPTH)


solid = part.part
